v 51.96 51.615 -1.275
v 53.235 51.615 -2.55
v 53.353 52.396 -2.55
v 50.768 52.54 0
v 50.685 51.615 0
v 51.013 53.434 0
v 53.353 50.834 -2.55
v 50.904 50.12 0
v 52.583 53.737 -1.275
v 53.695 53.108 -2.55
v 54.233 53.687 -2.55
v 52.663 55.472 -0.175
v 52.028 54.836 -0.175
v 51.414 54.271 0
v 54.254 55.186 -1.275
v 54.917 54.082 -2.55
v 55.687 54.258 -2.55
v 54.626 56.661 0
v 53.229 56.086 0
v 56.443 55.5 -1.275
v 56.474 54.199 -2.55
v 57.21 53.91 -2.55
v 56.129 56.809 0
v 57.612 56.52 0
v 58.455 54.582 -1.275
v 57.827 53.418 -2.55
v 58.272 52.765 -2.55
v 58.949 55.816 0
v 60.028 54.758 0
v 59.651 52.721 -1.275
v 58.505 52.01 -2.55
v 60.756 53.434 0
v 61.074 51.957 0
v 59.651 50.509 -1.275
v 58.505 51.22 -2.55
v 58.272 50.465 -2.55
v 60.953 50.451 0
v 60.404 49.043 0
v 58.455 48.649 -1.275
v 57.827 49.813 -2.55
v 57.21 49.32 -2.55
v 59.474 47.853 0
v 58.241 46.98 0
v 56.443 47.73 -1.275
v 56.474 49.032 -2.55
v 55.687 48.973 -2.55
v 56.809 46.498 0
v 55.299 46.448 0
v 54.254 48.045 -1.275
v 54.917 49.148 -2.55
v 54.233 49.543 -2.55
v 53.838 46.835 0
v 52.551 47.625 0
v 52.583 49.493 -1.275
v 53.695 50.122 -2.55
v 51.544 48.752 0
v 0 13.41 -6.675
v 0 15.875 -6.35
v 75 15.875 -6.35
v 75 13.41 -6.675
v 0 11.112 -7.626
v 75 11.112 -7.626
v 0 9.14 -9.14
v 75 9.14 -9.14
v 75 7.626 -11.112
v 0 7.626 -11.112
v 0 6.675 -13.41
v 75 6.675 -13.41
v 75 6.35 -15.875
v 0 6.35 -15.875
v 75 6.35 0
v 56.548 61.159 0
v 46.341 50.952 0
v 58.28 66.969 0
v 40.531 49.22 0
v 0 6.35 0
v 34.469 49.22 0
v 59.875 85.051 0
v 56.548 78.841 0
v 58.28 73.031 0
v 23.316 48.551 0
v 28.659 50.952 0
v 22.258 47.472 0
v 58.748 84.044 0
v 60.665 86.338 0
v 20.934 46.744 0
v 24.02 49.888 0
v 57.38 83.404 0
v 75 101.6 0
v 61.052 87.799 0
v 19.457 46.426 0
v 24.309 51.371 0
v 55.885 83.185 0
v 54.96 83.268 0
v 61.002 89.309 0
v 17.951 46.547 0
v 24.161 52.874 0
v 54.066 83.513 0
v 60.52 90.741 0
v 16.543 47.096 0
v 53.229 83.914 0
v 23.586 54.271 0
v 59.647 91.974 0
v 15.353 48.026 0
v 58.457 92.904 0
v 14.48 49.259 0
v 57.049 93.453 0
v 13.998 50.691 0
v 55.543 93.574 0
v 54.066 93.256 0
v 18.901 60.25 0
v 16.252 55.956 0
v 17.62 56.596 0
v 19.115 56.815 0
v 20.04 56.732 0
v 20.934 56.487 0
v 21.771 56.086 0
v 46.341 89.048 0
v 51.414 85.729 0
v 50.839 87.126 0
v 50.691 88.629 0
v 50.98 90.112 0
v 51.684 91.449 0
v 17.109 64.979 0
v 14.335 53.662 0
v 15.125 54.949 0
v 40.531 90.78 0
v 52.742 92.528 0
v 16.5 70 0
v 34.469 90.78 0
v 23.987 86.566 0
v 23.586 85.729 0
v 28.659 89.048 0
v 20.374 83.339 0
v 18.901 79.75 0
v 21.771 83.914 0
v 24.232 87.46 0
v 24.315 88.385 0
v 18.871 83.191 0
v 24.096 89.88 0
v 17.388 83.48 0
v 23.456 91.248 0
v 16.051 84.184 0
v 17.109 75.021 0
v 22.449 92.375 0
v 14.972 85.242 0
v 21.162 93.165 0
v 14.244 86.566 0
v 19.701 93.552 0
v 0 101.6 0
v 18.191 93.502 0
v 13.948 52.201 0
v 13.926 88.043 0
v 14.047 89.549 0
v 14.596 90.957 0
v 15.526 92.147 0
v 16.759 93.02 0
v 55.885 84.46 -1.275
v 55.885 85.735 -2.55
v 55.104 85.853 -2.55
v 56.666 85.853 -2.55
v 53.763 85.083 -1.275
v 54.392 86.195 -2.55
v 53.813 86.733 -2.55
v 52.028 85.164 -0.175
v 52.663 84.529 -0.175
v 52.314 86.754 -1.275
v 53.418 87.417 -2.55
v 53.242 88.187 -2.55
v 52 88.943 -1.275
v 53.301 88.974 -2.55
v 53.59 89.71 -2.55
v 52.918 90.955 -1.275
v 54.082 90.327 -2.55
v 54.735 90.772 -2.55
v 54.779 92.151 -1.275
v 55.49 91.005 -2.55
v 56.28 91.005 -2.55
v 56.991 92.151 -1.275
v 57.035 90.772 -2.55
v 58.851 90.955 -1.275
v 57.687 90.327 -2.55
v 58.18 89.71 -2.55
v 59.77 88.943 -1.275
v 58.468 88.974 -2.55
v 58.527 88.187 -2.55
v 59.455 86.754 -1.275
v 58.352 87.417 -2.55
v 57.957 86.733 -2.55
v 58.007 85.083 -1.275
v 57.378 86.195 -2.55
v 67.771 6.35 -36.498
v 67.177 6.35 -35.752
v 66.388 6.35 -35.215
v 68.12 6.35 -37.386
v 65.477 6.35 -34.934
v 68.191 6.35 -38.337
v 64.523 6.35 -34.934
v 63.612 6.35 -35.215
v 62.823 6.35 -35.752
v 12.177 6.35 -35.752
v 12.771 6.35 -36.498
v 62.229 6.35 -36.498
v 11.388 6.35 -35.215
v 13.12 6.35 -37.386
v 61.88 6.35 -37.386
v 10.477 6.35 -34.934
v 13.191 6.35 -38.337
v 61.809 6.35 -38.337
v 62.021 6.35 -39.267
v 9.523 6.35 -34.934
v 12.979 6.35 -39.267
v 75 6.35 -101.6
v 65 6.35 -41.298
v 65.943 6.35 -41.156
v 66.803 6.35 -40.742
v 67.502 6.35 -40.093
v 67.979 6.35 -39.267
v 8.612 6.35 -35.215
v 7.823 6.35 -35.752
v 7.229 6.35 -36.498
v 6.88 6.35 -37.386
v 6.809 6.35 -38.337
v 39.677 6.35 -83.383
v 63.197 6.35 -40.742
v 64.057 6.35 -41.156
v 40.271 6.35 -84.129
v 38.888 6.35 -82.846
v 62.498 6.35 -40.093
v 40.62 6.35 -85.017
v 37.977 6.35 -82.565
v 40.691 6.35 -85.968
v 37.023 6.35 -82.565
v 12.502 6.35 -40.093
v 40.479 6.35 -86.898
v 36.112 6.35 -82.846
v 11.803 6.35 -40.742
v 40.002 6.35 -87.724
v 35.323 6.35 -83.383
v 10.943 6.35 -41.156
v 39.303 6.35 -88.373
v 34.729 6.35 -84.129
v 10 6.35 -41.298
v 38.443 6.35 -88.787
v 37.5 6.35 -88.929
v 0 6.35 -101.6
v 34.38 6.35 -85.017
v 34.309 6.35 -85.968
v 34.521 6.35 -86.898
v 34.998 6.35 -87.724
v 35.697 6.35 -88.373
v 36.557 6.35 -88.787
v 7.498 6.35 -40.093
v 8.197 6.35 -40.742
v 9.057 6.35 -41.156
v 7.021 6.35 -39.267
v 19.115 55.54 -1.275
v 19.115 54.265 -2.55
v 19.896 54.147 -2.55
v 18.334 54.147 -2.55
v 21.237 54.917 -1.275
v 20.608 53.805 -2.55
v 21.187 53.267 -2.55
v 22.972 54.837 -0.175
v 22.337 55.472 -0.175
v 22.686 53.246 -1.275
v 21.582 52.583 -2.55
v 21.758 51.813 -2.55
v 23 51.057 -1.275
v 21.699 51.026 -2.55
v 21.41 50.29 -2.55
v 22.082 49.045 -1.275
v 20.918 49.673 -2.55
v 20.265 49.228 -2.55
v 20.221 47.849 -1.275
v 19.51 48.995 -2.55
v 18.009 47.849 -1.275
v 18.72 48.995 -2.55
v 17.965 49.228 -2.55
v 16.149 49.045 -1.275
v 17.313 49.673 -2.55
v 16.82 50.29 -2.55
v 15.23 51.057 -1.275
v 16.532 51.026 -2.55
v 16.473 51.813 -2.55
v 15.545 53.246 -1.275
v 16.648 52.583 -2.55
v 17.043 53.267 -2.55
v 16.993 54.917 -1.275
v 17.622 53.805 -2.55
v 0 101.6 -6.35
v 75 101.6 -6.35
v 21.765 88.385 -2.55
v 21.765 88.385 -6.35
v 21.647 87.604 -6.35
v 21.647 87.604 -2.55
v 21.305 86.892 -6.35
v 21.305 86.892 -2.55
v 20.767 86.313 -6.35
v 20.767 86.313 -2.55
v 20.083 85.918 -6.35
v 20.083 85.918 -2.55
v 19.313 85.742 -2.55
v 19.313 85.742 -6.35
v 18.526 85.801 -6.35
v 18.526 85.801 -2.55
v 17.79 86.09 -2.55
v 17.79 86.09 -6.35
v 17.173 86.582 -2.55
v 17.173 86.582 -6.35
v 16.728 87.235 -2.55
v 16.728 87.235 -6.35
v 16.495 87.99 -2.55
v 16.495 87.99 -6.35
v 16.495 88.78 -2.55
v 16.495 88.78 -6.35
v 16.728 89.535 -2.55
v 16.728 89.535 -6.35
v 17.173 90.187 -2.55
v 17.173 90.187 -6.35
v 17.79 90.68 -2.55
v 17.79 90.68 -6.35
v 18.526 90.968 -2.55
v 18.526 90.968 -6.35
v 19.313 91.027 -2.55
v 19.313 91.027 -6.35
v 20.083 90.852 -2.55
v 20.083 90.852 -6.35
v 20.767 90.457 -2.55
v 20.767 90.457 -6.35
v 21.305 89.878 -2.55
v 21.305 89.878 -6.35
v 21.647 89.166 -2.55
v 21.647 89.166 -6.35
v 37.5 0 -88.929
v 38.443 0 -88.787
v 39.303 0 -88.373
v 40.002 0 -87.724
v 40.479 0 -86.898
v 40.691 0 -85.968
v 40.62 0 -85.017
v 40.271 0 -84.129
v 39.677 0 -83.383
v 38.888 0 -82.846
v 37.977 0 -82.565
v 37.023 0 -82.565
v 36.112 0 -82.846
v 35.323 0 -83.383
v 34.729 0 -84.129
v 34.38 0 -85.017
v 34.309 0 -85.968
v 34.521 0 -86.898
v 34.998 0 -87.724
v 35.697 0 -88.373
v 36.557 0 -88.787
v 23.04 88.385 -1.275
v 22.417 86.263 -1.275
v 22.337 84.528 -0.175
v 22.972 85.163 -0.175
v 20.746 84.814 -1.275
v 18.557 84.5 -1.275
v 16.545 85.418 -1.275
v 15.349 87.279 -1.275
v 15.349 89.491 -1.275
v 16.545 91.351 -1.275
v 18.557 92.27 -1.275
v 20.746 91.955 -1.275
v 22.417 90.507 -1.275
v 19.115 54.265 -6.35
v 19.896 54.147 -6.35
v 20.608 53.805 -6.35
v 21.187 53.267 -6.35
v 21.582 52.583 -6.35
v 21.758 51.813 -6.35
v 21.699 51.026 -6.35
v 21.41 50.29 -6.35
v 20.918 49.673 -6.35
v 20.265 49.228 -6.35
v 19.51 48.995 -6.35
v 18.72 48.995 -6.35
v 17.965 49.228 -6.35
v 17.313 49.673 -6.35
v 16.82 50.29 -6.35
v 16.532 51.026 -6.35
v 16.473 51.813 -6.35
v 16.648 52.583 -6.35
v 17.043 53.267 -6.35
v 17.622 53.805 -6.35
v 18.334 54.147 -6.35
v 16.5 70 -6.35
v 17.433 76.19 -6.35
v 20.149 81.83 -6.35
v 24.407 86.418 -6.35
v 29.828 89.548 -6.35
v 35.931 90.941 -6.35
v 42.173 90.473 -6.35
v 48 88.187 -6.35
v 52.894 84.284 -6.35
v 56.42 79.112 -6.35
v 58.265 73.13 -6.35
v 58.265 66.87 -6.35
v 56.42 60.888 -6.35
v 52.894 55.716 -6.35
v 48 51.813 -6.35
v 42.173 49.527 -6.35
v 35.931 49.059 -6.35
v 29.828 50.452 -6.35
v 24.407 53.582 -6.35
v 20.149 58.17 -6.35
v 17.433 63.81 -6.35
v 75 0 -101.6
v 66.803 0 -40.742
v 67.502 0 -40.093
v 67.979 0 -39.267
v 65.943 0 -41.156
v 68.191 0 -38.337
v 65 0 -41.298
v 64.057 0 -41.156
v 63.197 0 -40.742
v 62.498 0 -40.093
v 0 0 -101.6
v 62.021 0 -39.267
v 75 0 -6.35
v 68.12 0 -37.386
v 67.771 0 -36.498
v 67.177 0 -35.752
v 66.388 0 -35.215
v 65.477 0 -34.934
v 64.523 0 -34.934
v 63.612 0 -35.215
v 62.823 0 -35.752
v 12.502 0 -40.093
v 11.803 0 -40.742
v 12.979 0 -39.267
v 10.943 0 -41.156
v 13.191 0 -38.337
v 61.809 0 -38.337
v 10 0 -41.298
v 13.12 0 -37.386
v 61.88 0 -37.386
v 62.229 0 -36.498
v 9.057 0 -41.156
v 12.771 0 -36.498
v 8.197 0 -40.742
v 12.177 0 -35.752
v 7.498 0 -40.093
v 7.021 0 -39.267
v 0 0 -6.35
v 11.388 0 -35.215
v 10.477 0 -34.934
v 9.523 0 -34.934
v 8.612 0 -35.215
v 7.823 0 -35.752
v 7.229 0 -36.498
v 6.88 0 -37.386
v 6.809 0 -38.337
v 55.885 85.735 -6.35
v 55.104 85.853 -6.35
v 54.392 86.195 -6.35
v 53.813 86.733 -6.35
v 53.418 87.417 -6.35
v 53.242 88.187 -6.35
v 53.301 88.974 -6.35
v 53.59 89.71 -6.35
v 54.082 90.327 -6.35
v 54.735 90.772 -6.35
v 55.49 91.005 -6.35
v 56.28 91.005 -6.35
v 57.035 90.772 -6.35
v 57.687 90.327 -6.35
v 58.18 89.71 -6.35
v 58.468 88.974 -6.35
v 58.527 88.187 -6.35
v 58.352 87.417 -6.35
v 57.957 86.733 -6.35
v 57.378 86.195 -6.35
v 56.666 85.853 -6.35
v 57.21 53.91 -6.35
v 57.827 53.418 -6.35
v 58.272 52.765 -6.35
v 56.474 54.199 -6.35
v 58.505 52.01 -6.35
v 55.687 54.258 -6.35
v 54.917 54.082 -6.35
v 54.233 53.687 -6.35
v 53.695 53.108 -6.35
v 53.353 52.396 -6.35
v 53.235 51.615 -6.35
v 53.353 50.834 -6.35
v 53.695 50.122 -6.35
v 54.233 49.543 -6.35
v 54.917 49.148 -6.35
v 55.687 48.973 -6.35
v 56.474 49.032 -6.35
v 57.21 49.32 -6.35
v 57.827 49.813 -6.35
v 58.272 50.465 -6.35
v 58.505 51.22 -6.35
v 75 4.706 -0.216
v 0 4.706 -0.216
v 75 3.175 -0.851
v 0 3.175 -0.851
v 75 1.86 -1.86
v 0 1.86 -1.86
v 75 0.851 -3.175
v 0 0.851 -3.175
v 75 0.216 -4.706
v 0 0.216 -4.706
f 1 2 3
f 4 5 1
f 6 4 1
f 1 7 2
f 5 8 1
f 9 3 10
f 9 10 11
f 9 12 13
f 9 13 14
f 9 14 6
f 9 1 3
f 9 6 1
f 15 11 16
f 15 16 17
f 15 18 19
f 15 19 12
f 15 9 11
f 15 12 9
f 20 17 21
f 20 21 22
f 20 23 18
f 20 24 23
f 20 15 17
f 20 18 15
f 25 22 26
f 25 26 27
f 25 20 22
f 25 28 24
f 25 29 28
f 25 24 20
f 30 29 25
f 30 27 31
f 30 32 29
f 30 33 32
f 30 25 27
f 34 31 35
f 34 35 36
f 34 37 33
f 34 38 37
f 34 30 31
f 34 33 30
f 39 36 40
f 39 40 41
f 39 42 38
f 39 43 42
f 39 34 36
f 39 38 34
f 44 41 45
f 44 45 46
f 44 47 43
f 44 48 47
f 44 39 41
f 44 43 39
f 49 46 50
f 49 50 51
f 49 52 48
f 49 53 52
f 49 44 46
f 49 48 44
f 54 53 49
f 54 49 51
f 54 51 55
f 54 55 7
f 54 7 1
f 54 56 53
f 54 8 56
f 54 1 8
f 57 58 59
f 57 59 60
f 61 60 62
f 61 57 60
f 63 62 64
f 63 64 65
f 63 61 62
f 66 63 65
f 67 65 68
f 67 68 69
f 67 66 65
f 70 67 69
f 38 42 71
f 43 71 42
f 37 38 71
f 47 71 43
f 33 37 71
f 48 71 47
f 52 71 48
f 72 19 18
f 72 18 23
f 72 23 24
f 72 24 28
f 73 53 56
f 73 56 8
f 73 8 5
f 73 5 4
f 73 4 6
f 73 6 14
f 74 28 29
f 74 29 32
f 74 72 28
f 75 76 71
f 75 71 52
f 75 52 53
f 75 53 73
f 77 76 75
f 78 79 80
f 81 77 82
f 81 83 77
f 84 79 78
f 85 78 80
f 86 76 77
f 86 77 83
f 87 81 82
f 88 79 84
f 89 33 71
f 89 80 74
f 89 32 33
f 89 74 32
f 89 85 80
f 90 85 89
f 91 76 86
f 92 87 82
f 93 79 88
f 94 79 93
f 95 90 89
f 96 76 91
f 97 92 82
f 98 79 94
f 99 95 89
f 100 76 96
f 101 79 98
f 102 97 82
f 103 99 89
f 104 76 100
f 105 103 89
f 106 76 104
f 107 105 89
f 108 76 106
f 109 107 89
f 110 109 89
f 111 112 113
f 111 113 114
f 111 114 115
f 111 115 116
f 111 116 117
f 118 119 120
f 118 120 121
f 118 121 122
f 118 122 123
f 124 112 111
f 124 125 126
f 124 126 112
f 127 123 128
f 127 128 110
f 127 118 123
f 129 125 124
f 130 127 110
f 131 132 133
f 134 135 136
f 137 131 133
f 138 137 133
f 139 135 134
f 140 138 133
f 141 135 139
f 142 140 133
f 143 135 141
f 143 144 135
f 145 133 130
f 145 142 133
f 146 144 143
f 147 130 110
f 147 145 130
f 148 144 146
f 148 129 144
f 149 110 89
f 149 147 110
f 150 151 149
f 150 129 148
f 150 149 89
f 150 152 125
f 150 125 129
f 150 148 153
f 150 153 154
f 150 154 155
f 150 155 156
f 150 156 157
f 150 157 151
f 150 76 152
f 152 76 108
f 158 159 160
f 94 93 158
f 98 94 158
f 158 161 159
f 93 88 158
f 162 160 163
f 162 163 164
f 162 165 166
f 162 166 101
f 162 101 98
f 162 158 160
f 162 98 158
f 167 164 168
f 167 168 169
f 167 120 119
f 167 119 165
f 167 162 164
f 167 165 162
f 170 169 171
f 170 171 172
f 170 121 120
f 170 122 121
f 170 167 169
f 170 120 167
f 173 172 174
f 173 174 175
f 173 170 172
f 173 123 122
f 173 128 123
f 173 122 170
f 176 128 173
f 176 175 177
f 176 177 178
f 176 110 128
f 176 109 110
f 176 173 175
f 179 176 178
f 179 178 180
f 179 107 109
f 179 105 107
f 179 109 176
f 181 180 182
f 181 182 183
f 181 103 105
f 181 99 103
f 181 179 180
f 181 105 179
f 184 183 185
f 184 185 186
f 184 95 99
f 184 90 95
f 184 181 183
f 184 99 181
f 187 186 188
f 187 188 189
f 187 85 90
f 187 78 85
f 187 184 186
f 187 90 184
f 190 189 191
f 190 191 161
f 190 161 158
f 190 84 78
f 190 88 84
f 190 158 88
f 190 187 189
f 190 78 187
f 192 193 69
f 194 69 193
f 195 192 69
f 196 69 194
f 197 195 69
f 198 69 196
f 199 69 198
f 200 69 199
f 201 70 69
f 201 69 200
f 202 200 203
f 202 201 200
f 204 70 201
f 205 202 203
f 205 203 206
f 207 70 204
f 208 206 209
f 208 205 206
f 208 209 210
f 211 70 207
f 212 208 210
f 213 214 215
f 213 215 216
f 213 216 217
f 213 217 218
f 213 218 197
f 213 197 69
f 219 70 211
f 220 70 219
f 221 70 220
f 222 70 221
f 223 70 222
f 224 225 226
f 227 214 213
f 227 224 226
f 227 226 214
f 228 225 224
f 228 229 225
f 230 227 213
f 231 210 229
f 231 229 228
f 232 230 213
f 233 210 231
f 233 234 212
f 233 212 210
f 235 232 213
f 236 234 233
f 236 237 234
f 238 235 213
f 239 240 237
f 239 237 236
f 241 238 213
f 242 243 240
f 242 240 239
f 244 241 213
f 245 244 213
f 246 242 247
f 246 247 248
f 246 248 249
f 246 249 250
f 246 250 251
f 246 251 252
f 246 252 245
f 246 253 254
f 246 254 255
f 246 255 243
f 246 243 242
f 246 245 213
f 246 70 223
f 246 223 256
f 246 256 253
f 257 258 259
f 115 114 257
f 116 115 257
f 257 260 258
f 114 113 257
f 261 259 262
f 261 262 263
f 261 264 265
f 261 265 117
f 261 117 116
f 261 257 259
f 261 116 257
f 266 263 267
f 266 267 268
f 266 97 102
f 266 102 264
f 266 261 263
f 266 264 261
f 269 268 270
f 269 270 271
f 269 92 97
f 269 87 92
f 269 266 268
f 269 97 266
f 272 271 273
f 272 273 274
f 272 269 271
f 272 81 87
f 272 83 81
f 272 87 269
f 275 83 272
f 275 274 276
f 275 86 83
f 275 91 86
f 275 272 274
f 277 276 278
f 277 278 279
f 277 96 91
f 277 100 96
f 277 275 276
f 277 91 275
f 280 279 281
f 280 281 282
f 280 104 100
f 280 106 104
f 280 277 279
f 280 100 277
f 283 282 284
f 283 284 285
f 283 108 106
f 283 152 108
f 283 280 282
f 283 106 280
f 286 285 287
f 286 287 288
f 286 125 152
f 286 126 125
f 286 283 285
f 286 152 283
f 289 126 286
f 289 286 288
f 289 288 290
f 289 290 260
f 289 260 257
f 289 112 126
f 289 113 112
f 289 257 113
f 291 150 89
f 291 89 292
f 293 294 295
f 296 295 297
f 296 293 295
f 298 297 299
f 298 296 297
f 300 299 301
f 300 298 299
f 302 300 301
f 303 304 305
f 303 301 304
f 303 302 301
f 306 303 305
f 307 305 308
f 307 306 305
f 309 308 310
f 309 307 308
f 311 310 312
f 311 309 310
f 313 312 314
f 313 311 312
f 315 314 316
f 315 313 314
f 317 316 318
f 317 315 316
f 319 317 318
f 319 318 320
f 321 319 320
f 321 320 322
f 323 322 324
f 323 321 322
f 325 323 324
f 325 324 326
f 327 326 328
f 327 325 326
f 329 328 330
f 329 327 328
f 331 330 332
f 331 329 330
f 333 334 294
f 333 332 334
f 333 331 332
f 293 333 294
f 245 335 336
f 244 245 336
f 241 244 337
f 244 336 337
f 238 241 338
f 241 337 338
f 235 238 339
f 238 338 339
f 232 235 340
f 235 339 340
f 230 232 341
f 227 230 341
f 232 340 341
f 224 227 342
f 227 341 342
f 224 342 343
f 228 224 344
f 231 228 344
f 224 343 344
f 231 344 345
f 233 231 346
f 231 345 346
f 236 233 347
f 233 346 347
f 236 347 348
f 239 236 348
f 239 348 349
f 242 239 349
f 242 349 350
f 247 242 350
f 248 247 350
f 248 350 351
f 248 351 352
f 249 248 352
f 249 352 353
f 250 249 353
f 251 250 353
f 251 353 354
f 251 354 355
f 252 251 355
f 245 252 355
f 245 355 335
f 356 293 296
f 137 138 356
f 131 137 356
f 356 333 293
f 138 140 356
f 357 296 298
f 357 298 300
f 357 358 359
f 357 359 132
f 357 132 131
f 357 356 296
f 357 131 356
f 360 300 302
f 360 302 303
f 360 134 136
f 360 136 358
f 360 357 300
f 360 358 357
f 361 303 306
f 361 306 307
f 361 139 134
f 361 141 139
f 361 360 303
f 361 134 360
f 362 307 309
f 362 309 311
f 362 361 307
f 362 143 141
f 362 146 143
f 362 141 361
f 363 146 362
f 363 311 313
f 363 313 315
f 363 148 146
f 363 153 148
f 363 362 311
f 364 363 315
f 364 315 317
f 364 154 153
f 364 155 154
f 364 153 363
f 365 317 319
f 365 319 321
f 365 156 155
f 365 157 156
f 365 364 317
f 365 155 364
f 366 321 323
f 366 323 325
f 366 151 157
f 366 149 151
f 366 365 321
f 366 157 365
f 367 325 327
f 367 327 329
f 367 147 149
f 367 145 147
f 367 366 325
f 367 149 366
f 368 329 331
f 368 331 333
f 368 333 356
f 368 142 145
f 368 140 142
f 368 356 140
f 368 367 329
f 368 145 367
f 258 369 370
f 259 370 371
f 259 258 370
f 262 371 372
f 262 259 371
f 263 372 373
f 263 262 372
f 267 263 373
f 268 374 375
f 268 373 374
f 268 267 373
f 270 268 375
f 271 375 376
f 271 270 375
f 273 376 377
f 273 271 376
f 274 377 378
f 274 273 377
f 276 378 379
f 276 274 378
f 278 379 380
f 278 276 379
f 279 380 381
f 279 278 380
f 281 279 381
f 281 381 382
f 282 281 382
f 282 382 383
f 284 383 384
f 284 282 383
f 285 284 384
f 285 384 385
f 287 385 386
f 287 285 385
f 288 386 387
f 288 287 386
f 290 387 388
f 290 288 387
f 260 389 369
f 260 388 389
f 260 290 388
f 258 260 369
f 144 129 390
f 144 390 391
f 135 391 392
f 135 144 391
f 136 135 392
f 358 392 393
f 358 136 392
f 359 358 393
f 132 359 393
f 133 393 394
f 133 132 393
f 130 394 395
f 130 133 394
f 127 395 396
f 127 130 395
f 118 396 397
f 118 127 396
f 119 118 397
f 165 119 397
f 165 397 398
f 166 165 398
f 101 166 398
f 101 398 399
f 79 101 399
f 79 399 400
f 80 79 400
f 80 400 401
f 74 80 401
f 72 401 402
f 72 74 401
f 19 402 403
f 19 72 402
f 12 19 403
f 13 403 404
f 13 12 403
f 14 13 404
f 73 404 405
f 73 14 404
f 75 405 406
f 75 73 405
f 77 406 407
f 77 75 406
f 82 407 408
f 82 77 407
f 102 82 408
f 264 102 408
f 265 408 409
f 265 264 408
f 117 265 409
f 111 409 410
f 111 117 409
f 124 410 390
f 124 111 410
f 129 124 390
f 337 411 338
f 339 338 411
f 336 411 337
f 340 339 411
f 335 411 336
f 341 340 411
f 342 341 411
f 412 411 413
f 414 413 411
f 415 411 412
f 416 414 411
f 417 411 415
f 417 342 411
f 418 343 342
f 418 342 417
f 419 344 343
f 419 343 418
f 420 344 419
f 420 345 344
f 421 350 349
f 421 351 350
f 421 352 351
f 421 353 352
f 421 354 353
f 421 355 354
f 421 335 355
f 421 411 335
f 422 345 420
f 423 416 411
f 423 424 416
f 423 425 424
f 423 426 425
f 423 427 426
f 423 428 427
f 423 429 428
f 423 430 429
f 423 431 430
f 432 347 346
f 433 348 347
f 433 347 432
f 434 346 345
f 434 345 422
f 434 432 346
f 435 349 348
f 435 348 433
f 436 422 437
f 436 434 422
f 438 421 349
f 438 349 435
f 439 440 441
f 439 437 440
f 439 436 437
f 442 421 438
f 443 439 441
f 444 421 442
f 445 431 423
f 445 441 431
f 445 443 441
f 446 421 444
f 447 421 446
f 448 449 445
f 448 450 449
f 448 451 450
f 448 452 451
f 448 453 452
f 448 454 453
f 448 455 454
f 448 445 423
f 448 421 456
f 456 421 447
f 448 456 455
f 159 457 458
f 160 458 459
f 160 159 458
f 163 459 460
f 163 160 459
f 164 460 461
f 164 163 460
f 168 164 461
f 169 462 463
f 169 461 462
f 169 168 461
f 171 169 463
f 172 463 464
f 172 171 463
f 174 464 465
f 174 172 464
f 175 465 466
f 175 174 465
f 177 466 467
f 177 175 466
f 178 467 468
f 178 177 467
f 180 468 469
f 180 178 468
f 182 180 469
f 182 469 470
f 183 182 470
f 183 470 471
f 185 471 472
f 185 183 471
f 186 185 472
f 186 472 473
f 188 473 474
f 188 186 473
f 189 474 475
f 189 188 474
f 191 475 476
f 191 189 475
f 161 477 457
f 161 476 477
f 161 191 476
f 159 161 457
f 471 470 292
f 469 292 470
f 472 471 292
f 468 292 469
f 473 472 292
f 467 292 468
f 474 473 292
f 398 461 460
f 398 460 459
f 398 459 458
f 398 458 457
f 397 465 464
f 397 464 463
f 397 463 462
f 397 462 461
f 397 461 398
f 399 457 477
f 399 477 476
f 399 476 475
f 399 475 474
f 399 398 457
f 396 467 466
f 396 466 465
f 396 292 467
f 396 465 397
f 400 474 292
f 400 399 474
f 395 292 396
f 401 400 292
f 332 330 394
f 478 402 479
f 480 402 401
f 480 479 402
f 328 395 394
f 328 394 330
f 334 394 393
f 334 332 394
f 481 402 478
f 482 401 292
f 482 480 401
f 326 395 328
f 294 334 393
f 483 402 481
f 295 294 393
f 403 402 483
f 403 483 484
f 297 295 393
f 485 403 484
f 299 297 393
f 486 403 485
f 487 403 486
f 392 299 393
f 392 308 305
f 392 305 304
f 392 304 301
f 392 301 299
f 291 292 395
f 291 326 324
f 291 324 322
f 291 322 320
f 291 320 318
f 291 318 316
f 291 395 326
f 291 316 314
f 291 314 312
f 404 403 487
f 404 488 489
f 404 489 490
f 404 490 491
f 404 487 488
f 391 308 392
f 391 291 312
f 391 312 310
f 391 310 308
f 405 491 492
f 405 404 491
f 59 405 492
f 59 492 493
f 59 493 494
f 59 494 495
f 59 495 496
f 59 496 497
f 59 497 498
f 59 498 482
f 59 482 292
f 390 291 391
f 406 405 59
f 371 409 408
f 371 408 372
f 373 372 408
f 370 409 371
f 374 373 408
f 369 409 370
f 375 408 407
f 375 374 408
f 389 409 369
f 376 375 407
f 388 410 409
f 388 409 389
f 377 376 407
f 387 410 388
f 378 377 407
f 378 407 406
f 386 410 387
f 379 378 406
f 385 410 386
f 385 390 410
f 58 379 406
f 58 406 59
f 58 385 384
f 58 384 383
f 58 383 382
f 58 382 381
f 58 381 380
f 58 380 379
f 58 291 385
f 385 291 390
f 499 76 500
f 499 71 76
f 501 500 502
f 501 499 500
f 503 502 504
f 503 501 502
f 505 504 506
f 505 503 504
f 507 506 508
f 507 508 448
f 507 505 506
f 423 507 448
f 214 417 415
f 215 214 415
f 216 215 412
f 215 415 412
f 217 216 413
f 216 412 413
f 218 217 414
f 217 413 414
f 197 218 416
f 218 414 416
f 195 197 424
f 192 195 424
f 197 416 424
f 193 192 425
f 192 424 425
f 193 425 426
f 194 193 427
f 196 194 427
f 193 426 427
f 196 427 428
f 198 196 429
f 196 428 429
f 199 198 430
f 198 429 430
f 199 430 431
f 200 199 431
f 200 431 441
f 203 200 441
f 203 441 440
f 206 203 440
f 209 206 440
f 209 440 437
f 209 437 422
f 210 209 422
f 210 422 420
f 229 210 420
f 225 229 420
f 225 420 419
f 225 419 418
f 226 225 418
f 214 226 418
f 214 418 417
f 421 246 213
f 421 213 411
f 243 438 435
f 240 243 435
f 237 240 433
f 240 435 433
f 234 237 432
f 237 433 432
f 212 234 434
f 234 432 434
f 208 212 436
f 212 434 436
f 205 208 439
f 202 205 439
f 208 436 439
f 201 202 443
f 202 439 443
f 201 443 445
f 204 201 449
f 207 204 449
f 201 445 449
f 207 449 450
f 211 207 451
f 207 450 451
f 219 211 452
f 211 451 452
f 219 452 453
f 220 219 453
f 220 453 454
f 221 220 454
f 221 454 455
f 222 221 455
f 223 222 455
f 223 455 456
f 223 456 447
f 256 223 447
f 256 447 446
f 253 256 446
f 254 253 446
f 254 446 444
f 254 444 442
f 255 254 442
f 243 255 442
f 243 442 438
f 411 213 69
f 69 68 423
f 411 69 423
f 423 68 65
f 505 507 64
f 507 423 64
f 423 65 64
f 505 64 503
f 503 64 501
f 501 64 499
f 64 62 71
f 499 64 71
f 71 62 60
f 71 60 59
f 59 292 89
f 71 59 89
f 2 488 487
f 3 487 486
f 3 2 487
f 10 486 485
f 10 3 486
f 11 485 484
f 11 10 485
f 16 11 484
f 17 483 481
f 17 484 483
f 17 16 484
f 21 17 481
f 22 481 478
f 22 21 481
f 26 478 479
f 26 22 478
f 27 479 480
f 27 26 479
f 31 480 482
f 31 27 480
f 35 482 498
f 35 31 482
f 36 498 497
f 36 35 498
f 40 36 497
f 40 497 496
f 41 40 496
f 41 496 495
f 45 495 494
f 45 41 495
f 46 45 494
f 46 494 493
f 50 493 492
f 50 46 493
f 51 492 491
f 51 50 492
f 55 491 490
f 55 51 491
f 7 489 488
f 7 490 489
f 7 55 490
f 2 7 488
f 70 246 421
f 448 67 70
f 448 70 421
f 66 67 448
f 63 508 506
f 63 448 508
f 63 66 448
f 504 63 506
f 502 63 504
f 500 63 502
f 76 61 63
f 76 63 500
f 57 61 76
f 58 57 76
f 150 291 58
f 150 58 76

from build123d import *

# Parameters (mm, degrees)
BOSS_EXTRUDE1_DEPTH  = 75
FILLET1_R            = 6.35
SKETCH2_R            = 21
CUT_EXTRUDE1_DEPTH   = 75
CIRPATTERN1_COUNT    = 4
M6_CLEARANCE_HOLE1_D = 6.4


with BuildPart() as part:
    # Sketch1 → Boss-Extrude1 (new body)
    with BuildSketch(Plane(origin=(0, 0, 0), x_dir=(0, 0, -1), z_dir=(1, 0, 0))):
        with BuildLine():
            Line((0, 0), (0, 101.6))
            Line((0, 101.6), (6.35, 101.6))
            Line((6.35, 101.6), (6.35, 15.875))
            ThreePointArc((6.35, 15.875), (9.139807909, 9.139807909), (15.875, 6.35))
            Line((15.875, 6.35), (101.6, 6.35))
            Line((101.6, 6.35), (101.6, 0))
            Line((101.6, 0), (0, 0))
        make_face()
    extrude(amount=BOSS_EXTRUDE1_DEPTH)

    # Fillet1
    fillet1_edges = [part.edges().sort_by_distance(p)[0] for p in [
        (37.5, 0, 0),
    ]]
    fillet(fillet1_edges, radius=FILLET1_R)

    # Sketch2 → Cut-Extrude1 (cut)
    with BuildSketch(Plane(origin=(0, 0, 0), x_dir=(-1, 0, 0), z_dir=(0, 0, -1))):
        with Locations((-37.5, 70)):
            Circle(SKETCH2_R)
    extrude(amount=CUT_EXTRUDE1_DEPTH, mode=Mode.SUBTRACT)

    # Sketch13 → CSK for M5 Flat Head Machine Screw3 (revolve, cut)
    with BuildSketch(Plane(origin=(55.884776311, 88.384776311, 0), x_dir=(0, -1, 0), z_dir=(1, 0, 0))):
        Polygon((0, 0), (0, 14.29228064), (2.65, 12.7), (2.65, 2.55), (5.2, 0), align=None)
    csk_for_m5_flat_head_machine_screw3 = revolve(axis=Axis((55.884776311, 88.384776311, 6.35), (0, 0, -1)), mode=Mode.SUBTRACT)

    # CirPattern1: CSK for M5 Flat Head Machine Screw3 ×4 about axis
    cirpattern1_axis = Axis((37.5, 70, -75), (0, 0, 1))
    for i in range(1, CIRPATTERN1_COUNT):
        add(csk_for_m5_flat_head_machine_screw3.rotate(cirpattern1_axis, i * 360 / CIRPATTERN1_COUNT), mode=Mode.SUBTRACT)

    # M6 Clearance Hole1 (through all)
    with Locations(Plane(origin=(37.5, 6.35, -85.729264805), x_dir=(0, 0, 1), z_dir=(0, 1, 0))):
        with Locations((0, 0), (47.631397208, 27.5), (47.631397208, -27.5)):
            Hole(M6_CLEARANCE_HOLE1_D / 2)


solid = part.part
